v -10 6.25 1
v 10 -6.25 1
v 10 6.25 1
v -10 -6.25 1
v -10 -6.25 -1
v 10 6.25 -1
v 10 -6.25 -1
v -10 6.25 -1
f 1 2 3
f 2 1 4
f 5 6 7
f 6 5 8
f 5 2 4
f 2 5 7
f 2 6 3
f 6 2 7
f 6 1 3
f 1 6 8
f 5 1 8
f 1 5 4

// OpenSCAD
// Generated by SolidPython 1.1.3 on 2022-12-12 15:48:57


cube(center = true, size = [20, 12.5000000000, 2]);
/***********************************************
*********      SolidPython code:      **********
************************************************
 
import solid
import pudb
from solid.utils import *
import viewscad
import subprocess
import os
import os.path as osp
import math

chamfer_extrude=solid.import_scad("./chamfer_extrude.scad")
chamfer_extrude=chamfer_extrude.chamfer_extrude
r = viewscad.Renderer(width=800, height=800)

def debug(model,f_name,path="/home/ts/code/projects/mfd/designs/debug"):
    solid.scad_render_to_file(model,osp.join(path,f_name)+".scad")
#generate position list of wells using offset from center
wells_pos_from_center_4 = lambda offset: [[-offset,offset],
                                        [offset, offset],
                                        [-offset, -offset],
                                        [offset, -offset]]
#wells_pos_from_center_2 = lambda offset: [[0,offset],
#                                        [0, -offset]]
wells_pos_from_center_2 = lambda offset: [[offset,0],
                                        [-offset,0]]

def wells_top_bottom(radius,height=None, positions = None, dxf = False):
    if positions is None:
        offset = radius+radius/2.0
        positions = wells_pos_from_center_2(offset)
    if dxf or (height is None):
        height = 0
    wells = []
    for position in positions:
        #make circle if making dxf
        if dxf:
            well_shape = solid.circle(r=radius, segments=64)
            well_shape = solid.translate([position[0],position[1]])(well_shape)
        #if stl make cylinder
        else:
            well_shape = solid.cylinder(r=radius, h=height, segments=64, center = True)
            well_shape = solid.translate([position[0],position[1],height/2.0])(well_shape)
        wells.append(well_shape)
    return  union()(*wells)

#place wells in four corners 
def four_corner(radius,height=None, positions = None, dxf = False):
    #if well pos not specified set
    #to equally spaced by half radius
    if positions is None:
        offset = radius+radius/2.0
        positions = wells_pos_from_center_4(offset)
    if dxf or (height is None):
        height = 0
    #make wells at positions with specified radius and height
    wells = []
    for position in positions:
        #make circle if making dxf
        if dxf:
            well_shape = solid.circle(r=radius, segments=64)
            well_shape = solid.translate([position[0],position[1]])(well_shape)
        #if stl make cylinder
        else:
            well_shape = solid.cylinder(r=radius, h=height, segments=64, center = True)
            well_shape = solid.translate([position[0],position[1],height/2.0])(well_shape)
        wells.append(well_shape)
    return  union()(*wells)

#generate channels 
def make_channels(length,width,height=0,num_chans=1,max_chans=None,spacing=None, dxf = False,
                  rotate_channels=False):
    if dxf or (height is None):
        height = 0
    #if channel gap not defined, is equal to
    if spacing is None: spacing = width
    #calculate number of channels if fitting max num within given width
    if not max_chans is None:
        import math
        num_chans = math.floor((max_chans-spacing)/(width+spacing))
    #get total width of channel section  
    total_width = (width*num_chans)+(spacing*(num_chans-1))

    #make template channel
    #if rotate_channels: width, length = length, width
    if dxf:
        channel_t = solid.square([length,width],center = True)
    else:
        channel_t = solid.cube([length,width,height], center = True)

    #if number channels is even, offset the first channel to center its gap
    if num_chans % 2 == 0: centering = -(width/2.0+spacing/2.0)
    else: centering = 0
    #move template channel up to align bottom at z = 0 
    #and offset center if necessary
    if dxf:
        channel_t = solid.translate([0,centering])(channel_t)
    else:
        channel_t = solid.translate([0,centering,height/2.0])(channel_t)

    #if rotate_channels: length,width = width,length
    #start making the channels
    channels = []
    for i in range(num_chans):
        #if i=0 there is no translation
        #if i=1, we make the first channel adjacent to second
        direction = i

        #if i>=1, we add channels alternating left and right
        if i >= 1:
            direction = -(i/2.0)
            if i % 2 == 1: direction = (-direction)+0.5
                
        #make channel at right position and add it to channel list
        translation_coords = [0,direction*(width+spacing)]
        #if rotate_channels: translation_coords = [direction*(width+spacing),0]
        if dxf:
            channel = solid.translate(translation_coords)(channel_t)
        else:
            channel = solid.translate([*translation_coords,0])(channel_t)
        channels.append(channel)
    
    #group all channels as one object
    channels = union()(*channels)
    #compute the x,y,z dimensions in order to pass as arguments 
    #for construction of other parts of device (such as the chambers)
    measurements = {'x':(length/2.0,-length/2.0),
                    'y':(total_width/2.0,-total_width/2.0)}
    if not dxf:
        measurements['z'] = (height,0)
    if rotate_channels:
        channels = solid.rotate(90)(channels)
        measurements['x'],measurements['y']=measurements['y'],measurements['x']
    return channels,measurements

def make_chambers(msrs,height=None,extra=0,len_until=None,width=None, dxf = False):
    #computes x,y,z length
    total = lambda x : abs(x[0]) + abs(x[1])
    
    #if specific height if specified
    #otherwise use same height as channels
    if dxf:
        pass
    elif not height is None:
        msrs['z'] = (height,0)
    else:
        msrs['z'] = (0,0)
        
    #make copy of measurements from channels to modify chamber dimensions 
    #and add length to chambers as specified
    chamber_dims = msrs.copy()
    #calculate length of chamber to reach specified offset
    if not len_until is None:
        chamber_len = len_until-(msrs['x'][0])
    #or add specified length to channel length (if not specified, adds 0)
    else:
        chamber_len = msrs['x'][0]+extra
    #set the chamber length based 
    chamber_dims['x'] = (chamber_len/2.0,-(chamber_len/2.0))
    #compute final dimensions of chamber
    if not width is None:
        chamber_dims['y'] = (width/2.0,-width/2.0)
    chamber_dims = [total(size) for size in chamber_dims.values()]
        
    #calculate chamber translation offset to place adjacent to channels
    chamber_trslt = msrs['x'][0]+(chamber_len/2.0)
    #compute chamber translation coordinates to align with channels
    #x = 1 moves chamber above channels
    #x = -1 moves chamber below channels
    if dxf:
        trslt = lambda x : [x*(chamber_trslt),0]
    else:
        trslt = lambda x : [x*(chamber_trslt),0,msrs['z'][0]/2.0]
    
    #function to make chamber at top or at bottom 
    if dxf:
        move = lambda x : solid.translate(trslt(x))(solid.square(chamber_dims, center = True) )
    else:
        move = lambda x : solid.translate(trslt(x))(solid.cube(chamber_dims,center = True))
    #make top and bottom chambers and return them as grouped
    top = move(1)
    bottom = move(-1)
    #chambers=solid.rotate(90)(solid.union()(top,bottom))
    chambers=(solid.union()(top,bottom))

    return chambers

#create alignment features 
def alignment_features(unit,dims,grid_size, mask_size = None, alignment = "hollow", units_from_center = (2.5,2.5), corner_len=None):
    width = grid_size[0]*dims[0]
    length = grid_size[1]*dims[1]
    if mask_size is None and corner_len is None:
        corner_len = (dims[0] + dims[1]) /2 / 8
    corner = lambda thickness_div : solid.union()( solid.square([corner_len,corner_len/thickness_div],center=False), solid.square([corner_len/thickness_div,corner_len],center=False) )
    
    def make_full(thickness_div):
        thickness = corner_len/thickness_div
        tr = solid.translate([0, 0, 0 ])(solid.rotate(180)(corner(thickness_div)))
        tr = solid.translate([thickness/2,thickness/2,0])(tr)
        bl = solid.translate([0, 0, 0 ])(solid.rotate(0)(corner(thickness_div)))
        bl = solid.translate([-thickness/2,-thickness/2,0])(bl)
        return solid.union()(tr,bl)
    
    def make_hollow(thickness_div):
        thickness = corner_len/(thickness_div/2)
        inner = make_full(thickness_div)
        outer = make_full(thickness_div/2)
        hollow = outer - inner 
        return hollow
    
    center = (width /2 , length/2)
    mask_pos = lambda x,y : (center[0] + x*(float(units_from_center[0])*dims[0]), center[1] + y*(float(units_from_center[1])*dims[1]))
    positions = []
    positions.append(mask_pos(1,0))
    positions.append(mask_pos(0,1))
    positions.append(mask_pos(-1,0))
    positions.append(mask_pos(0,-1))
    make_mask = lambda mtype : make_hollow(8) if mtype == "hollow" else make_full(8)
    masks = [ solid.translate([*position,0])(make_mask(alignment)) for position in positions]
    
    solid.scad_render_to_file(solid.union()(*masks),"./designs/open_chamber/masks.scad")
    #return unit - solid.union()(*masks)
    return solid.union()(*masks,unit)

def create_outline(thickness, array, dims, grid_size,):
    width = grid_size[0]*dims[0] + thickness *2
    length = grid_size[1]*dims[1] + thickness *2
    outer = solid.translate([-thickness, -thickness,0])(solid.square([width, length]))
    return outer-array

def create_wall(wall_thickness, outline_thickness, dims, grid_size, wall_height = 2000, dxf = False):
    inner_width = grid_size[0]*dims[0] + outline_thickness *2
    inner_length = grid_size[1]*dims[1] + outline_thickness *2
    outer_width = inner_width + wall_thickness * 2
    outer_length = inner_length + wall_thickness * 2
    outer_pos_x = -outline_thickness-wall_thickness
    outer_pos_y = -outline_thickness-wall_thickness
    inner_pos_x = -outline_thickness
    inner_pos_y = -outline_thickness
    if dxf:
        inner_wall = solid.translate([inner_pos_x,
                                      inner_pos_y,
                                      0])(solid.square([inner_width, inner_length]))
        outer_wall = solid.translate([outer_pos_x,
                                      outer_pos_y,
                                      0])(solid.square([outer_width, outer_length]))

        return outer_wall-inner_wall
    else:
        inner_wall = solid.translate([inner_pos_x,
                                      inner_pos_y,
                                      0])(solid.cube([inner_width, inner_length,wall_height]))
        outer_wall = solid.translate([outer_pos_x,
                                      outer_pos_y,
                                      0])(solid.cube([outer_width, outer_length,wall_height]))

        return outer_wall-inner_wall, {'wall_height': wall_height,
                                       'wall_thickness': wall_thickness,
                                       'inner_width':inner_width,
                                       'inner_length': inner_length,
                                       'outer_width': outer_width,
                                       'outer_length': outer_length,
                                       'outer_pos_x' : outer_pos_x,
                                       'outer_pos_y' : outer_pos_y,
                                       'inner_pos_x' : inner_pos_x,
                                       'inner_pos_y' : inner_pos_y}

def create_thicker_wall(wall_thickness, outer_wall_offset, wall_dims, dims, grid_size, height_start = .2, height_end=2, dxf = False):
    addon_wall,thicker_wall_dims = create_wall(wall_thickness, outer_wall_offset, dims, grid_size, wall_height=height_end-height_start, dxf = False)
    addon_wall = solid.translate([0,0,height_start])(addon_wall)

    thicker_wall_dims['wall_height'] = height_end
    thicker_wall_dims['wall_thickness'] = wall_dims['wall_thickness'] + wall_thickness
    return addon_wall, thicker_wall_dims
 
def add_lock_to_wall(wall,wall_dims,y_offset = 0,cut_ratio=0.7,L_length=3, gap_ratio=0.05, axis="x",width_ratio=1/2):
    # Makes L shape
    def make_L(max_length,length_thickness,max_width,width_thickness,height,y_offset):
        length = solid.cube([max_length,length_thickness,height])
        width = solid.cube([width_thickness,max_width,height])
        width = solid.translate([max_length-(width_thickness),0,0])(width)
        L = solid.union()(width,length)
        debug(L,"L")
        if axis == "x":
            L = solid.rotate(-90)(L)
            L = solid.translate([0,max_length,0])(L)
        else:
            L = solid.rotate(-180)(L)
            L = solid.translate([max_length,max_width,0])(L)
        return solid.translate([0,0,y_offset])(L)
    
    lock_length = L_length
    lock_width = wall_dims['wall_thickness']*width_ratio
    lock_length_thickness = lock_width/2
    lock_width_thickness = lock_width/2
    L_lock = make_L(lock_length,lock_length_thickness,lock_width,lock_width_thickness, wall_dims['wall_height']-y_offset, y_offset)
    
    margin_space = lock_length - lock_length*(1-gap_ratio)
    key_length = lock_length-margin_space
    key_length_thickness = lock_length_thickness-(margin_space*2)
    key_width = lock_width-(margin_space*2)
    key_width_thickness = lock_width_thickness-(margin_space*2)
    L_key = make_L(key_length,key_length_thickness,key_width,key_width_thickness, wall_dims['wall_height']-y_offset, y_offset)
    L_key = solid.translate([margin_space,margin_space,0])(L_key)
    L = solid.union()(L_lock,L_key)
    debug(L,"L")
    
    #Make cube to be used as negative to split frame in a half
    #Can choose if making left or right negative, specify ratio of split
    def make_negative(right,cut_ratio):
        if axis == "x":
            if right:
                length = wall_dims['outer_length']*(1-cut_ratio)
                pos_x = wall_dims['outer_pos_x']+(wall_dims['outer_length']*cut_ratio)
            else:
                length = wall_dims['outer_length']*(cut_ratio)
                pos_x = wall_dims['outer_pos_x'] 
            negative = solid.cube([wall_dims['outer_width'],length, wall_dims['wall_height']])
            negative = solid.translate([wall_dims['outer_pos_y'],pos_x,0])(negative)
        else:
            if right:
                length = wall_dims['outer_width']*(1-cut_ratio)
                pos_x = wall_dims['outer_pos_y']+(wall_dims['outer_width']*cut_ratio)
            else:
                length = wall_dims['outer_width']*(cut_ratio)
                pos_x = wall_dims['outer_pos_y'] 
            negative = solid.cube([length,wall_dims['outer_length'], wall_dims['wall_height']])
            negative = solid.translate([pos_x,wall_dims['outer_pos_x'],0])(negative)
        return negative, pos_x, length 
                      
    #Make negatives
    negative_right, right_half_pos_x, right_half_length = make_negative(True,cut_ratio)
    negative_left, left_half_pos_x, right_half_length = make_negative(False,cut_ratio)
    #Make halves
    left_half = solid.difference()(wall,negative_right)
    right_half = solid.difference()(wall,negative_left)
    def place_L(L, L_length,L_width):
        #Place L on top wall       
        offset_to_center = (wall_dims['wall_thickness']-L_width)/2
        if axis == "x":
            y_pos_top = (wall_dims['outer_pos_y'] +
                    wall_dims['outer_width'] - 
                    L_width - offset_to_center)
            top_L = solid.translate([y_pos_top,
                                     right_half_pos_x-(L_length),
                                     0])(L)
            #Place L on bottom wall       
            y_pos_bottom = wall_dims['outer_pos_y']+offset_to_center
            bottom_L = solid.translate([y_pos_bottom,
                                        right_half_pos_x-L_length,
                                        0])(L)
        else:
            y_pos_top = (wall_dims['outer_pos_x'] +
                    wall_dims['outer_length'] -
                    (L_width+offset_to_center))
            top_L = solid.translate([right_half_pos_x-L_length,
                                     y_pos_top,
                                     0])(L)
            #Place L on bottom wall       
            y_pos_bottom = wall_dims['outer_pos_y']+offset_to_center
            bottom_L = solid.translate([right_half_pos_x-L_length,
                                        y_pos_bottom,
                                        0])(L)
        return bottom_L, top_L
    #Make complimentary L pieces through union and differences
    #Make Lock
    bottom_L_lock, top_L_lock = place_L(L_lock,L_length,lock_width)
    left_half = solid.difference()(left_half,bottom_L_lock)
    left_half = solid.difference()(left_half,top_L_lock)
    #Make Key
    bottom_L_key, top_L_key = place_L(L_key,L_length,lock_width)
    right_half = solid.union()(right_half,bottom_L_key)
    right_half = solid.union()(right_half,top_L_key)
    return left_half, right_half


#build a row x col grid of containment units
def make_unit_array(unit,dims,grid_size, dxf = False, alignment = None, mask_size = None,
                    units_from_center = None,alignment_offset=None, alignment_mark_size=1):
    units = []
    for col in range(grid_size[1]):
        for row in range(grid_size[0]):
            if dxf:
                units.append(solid.translate([row*dims[0],col*dims[1]])(unit))
            else:
                units.append(solid.translate([row*dims[0],col*dims[1],dims[2]/2.0])(unit))
    array = solid.union()(*units)
    if (not alignment is None) and dxf:
        if not alignment_offset is None:
            array = solid.translate([alignment_offset[0],alignment_offset[1]])(array)
        array = alignment_features(array,dims, grid_size, alignment = alignment, mask_size = None, units_from_center = units_from_center,corner_len=alignment_mark_size)
        if not alignment_offset is None:
            array = solid.translate([-alignment_offset[0],-alignment_offset[1]])(array)
    return array


def make_taylor(wells_pos = wells_pos_from_center_4(2.25), well_rad = 1.5 ,
                well_height = 2, chan_w = 0.01, chan_l = 1, chan_h = 0.010 ,
                chan_gap = 0.040, max_chans = None,num_chans=100, chamber_height  = 0.100,
                columns = 1, rows = 1, chamber_len_until=2.25, add_channels = True, add_wells = True, 
                add_chambers = True, save_path = "./", alignment = None, units_from_center = 2,
                mask_size = None, render_stl = False, outline_thickness = 0.050, dxf = True,
                wall_height = 15, wall_thickness = 0.95, casing_x=9, casing_y=9, casing_z=0,rotate_units=0):

    dims = [casing_x, casing_y, casing_z]
    wells = four_corner(well_rad,well_height, dxf = dxf, positions = wells_pos)
    debug(wells,"wells")
    channels, msrs = make_channels(chan_l,chan_w,chan_h,dxf=dxf, spacing = chan_gap, max_chans=max_chans,num_chans=num_chans)
    debug(channels,"channels")
    chambers = make_chambers(msrs,dxf = dxf, height=chamber_height,len_until=chamber_len_until)
    debug(chambers,"chambers")

    #add together and render
    device_parts = []
    if add_channels:
        device_parts.append(channels)
    if add_wells:
        device_parts.append(wells)
    if add_chambers:
        device_parts.append(chambers)
    device=union()(*device_parts)
    device = rotate(rotate_units)(device)

    device=solid.translate([dims[0]/2.0,dims[1]/2.0,0])(device)
    channels = rotate(rotate_units)(channels)
    channels=solid.translate([dims[0]/2,dims[1]/2,0])(channels)
    chambers_wells = union()(wells,chambers)
    chambers_wells = rotate(rotate_units)(chambers_wells)
    chambers_wells=solid.translate([dims[0]/2,dims[1]/2,0])(chambers_wells)

    file_name = str(rows)+'x'+str(columns)+'_units_'
    grid_size = [rows,columns]

    if alignment:
        alignment="full"
    device = make_unit_array(device,dims,grid_size, dxf=dxf, alignment = alignment,
                                 units_from_center = units_from_center)
    channels = make_unit_array(channels,dims,grid_size, dxf=dxf, alignment = alignment,
                                 units_from_center = units_from_center)
    if alignment=="full":
        alignment="hollow"

    chambers_wells = make_unit_array(chambers_wells,dims,grid_size, dxf=dxf, alignment = alignment,
                                 units_from_center =units_from_center)

    def save_model(model,prefix):
        model_fname = os.path.abspath(save_path+prefix+"_"+file_name+".scad")
        solid.scad_render_to_file(model,model_fname)
        return model_fname

    wells_fname = save_model(wells,"wells")
    channels_fname = save_model(channels,"channels")
    device_fname = save_model(device,"device")
    chambers_wells_fname = save_model(chambers_wells,"chambers_wells")
    return (chambers_wells,chambers_wells_fname), (channels,channels_fname), (device,device_fname)

def make_device(design='open',rows=8,columns=6,wells_pos = 4.5, well_rad=3.2,well_height=0.1,
                chan_l=1,chan_w=0.01,chan_h=0.01,chan_gap=0.015,num_chans=101,dxf=True,save_path="./designs/open_chamber/",
                casing_x=9.0,casing_y=18.0,casing_z=0,rotate_units=90,units_from_center=(3,1),chamber_len_until=4.5,
                chamber_width=None,alignment=True, add_wells=True, add_channels=True,add_chambers=True):

    dims = [casing_x, casing_y, casing_z]
    if design == "open":
        wells_pos=wells_pos_from_center_2(wells_pos)
        wells = wells_top_bottom(well_rad,height=well_height, dxf = dxf, positions = wells_pos)
    elif design == "closed":
        wells_pos=wells_pos_from_center_4(wells_pos)
        wells = four_corner(well_rad,well_height, dxf = dxf, positions = wells_pos)
    else:
        print(design+" is not a valid design.\n Choose valid design: 'open' or 'closed'")
        exit()
    wells = rotate(rotate_units)(wells)
    wells=solid.translate([dims[0]/2,dims[1]/2,0])(wells)



    channels, msrs = make_channels(chan_l,chan_w,chan_h,dxf=dxf, spacing = chan_gap, num_chans=num_chans,rotate_channels=False)
    channels = rotate(rotate_units)(channels)
    channels=solid.translate([dims[0]/2,dims[1]/2,0])(channels)

    chambers=make_chambers(msrs,height=None,extra=0,len_until=chamber_len_until, width=chamber_width,dxf = dxf)
    chambers = rotate(rotate_units)(chambers)
    chambers=solid.translate([dims[0]/2,dims[1]/2,0])(chambers)

    device_parts = []
    if add_channels:
        device_parts.append(channels)
    if add_wells:
        device_parts.append(wells)
    if add_chambers:
        device_parts.append(chambers)
    device = union()(*device_parts)
    #device = rotate(rotate_units)(device)
    #device=solid.translate([dims[0]/2.0,dims[1]/2.0,0])(device)

    chambers_wells = []
    if add_chambers:
        chambers_wells.append(chambers)
    if add_wells:
        chambers_wells.append(wells)
    chambers_wells = union()(*chambers_wells)
    #chambers_wells = union()(wells,chambers)
    #chambers_wells = rotate(rotate_units)(chambers_wells)
    #chambers_wells=solid.translate([dims[0]/2,dims[1]/2,0])(chambers_wells)

    file_name = str(rows)+'x'+str(columns)+'_units_'

    grid_size = [rows,columns]
    if alignment:
        alignment="full"
    device = make_unit_array(device,dims,grid_size, dxf=dxf, alignment = alignment,
                                 units_from_center = units_from_center)
    channels = make_unit_array(channels,dims,grid_size, dxf=dxf, alignment = alignment,
                                 units_from_center = units_from_center)
    if alignment=="full":
        alignment="hollow"

    chambers_wells = make_unit_array(chambers_wells,dims,grid_size, dxf=dxf, alignment = alignment,
                                 units_from_center =units_from_center)

    def save_model(model,prefix):
        model_fname = os.path.abspath(save_path+prefix+"_"+file_name+".scad")
        solid.scad_render_to_file(model,model_fname)
        return model_fname

    wells_fname = save_model(wells,"wells")
    channels_fname = save_model(channels,"channels")
    device_fname = save_model(device,"device")
    chambers_wells_fname = save_model(chambers_wells,"chambers_wells")
    return (chambers_wells,chambers_wells_fname), (channels,channels_fname), (device,device_fname)


def make_open_chamber(rows=8,columns=6,wells_pos = wells_pos_from_center_2(4.5), well_rad=3.2,well_height=0.1,
                      chan_l=1,chan_w=0.01,chan_h=0.01,chan_gap=0.015,num_chans=101,dxf=True,save_path="./designs/open_chamber/",
                      casing_x=9.0,casing_y=18.0,casing_z=0,rotate_units=90,units_from_center=(3,1),chamber_len_until=4.5,
                      chamber_width=None,alignment=True, add_wells=True, add_channels=True,add_chambers=True):

    dims = [casing_x, casing_y, casing_z]
    wells = wells_top_bottom(well_rad,height=well_height, dxf = dxf, positions = wells_pos)
    channels, msrs = make_channels(chan_l,chan_w,chan_h,dxf=dxf, spacing = chan_gap, num_chans=num_chans,rotate_channels=False)
    chambers=make_chambers(msrs,height=None,extra=0,len_until=chamber_len_until, width=chamber_width,dxf = dxf)
    debug(chambers,"chambers")
    device_parts = []
    if add_channels:
        device_parts.append(channels)
    if add_wells:
        device_parts.append(wells)
    if add_chambers:
        device_parts.append(chambers)
    device = union()(*device_parts)
    device = rotate(rotate_units)(device)
    device=solid.translate([dims[0]/2.0,dims[1]/2.0,0])(device)
    channels = rotate(rotate_units)(channels)
    channels=solid.translate([dims[0]/2,dims[1]/2,0])(channels)
    chambers_wells = union()(wells,chambers)
    chambers_wells = rotate(rotate_units)(chambers_wells)
    chambers_wells=solid.translate([dims[0]/2,dims[1]/2,0])(chambers_wells)

    file_name = str(rows)+'x'+str(columns)+'_units_'

    grid_size = [rows,columns]
    if alignment:
        alignment="full"
    device = make_unit_array(device,dims,grid_size, dxf=dxf, alignment = alignment,
                                 units_from_center = units_from_center)
    channels = make_unit_array(channels,dims,grid_size, dxf=dxf, alignment = alignment,
                                 units_from_center = units_from_center)
    if alignment=="full":
        alignment="hollow"

    chambers_wells = make_unit_array(chambers_wells,dims,grid_size, dxf=dxf, alignment = alignment,
                                 units_from_center =units_from_center)

    def save_model(model,prefix):
        model_fname = os.path.abspath(save_path+prefix+"_"+file_name+".scad")
        solid.scad_render_to_file(model,model_fname)
        return model_fname

    wells_fname = save_model(wells,"wells")
    channels_fname = save_model(channels,"channels")
    device_fname = save_model(device,"device")
    chambers_wells_fname = save_model(chambers_wells,"chambers_wells")
    return (chambers_wells,chambers_wells_fname), (channels,channels_fname), (device,device_fname)

def to_dxf(scad_path):
    dxf_path = scad_path.replace(".scad",".dxf")
    subprocess.call(["openscad", "-o", dxf_path, scad_path])
    import ezdxf
    temp_dxf = ezdxf.readfile(dxf_path)
    temp_dxf.saveas(dxf_path)

#def make_walls(diameter,thickness,grid_size,dims,height=20,segments=256,make_inner=True):
#    wafer_wall_out = solid.cylinder(r=diameter/2,h=height, segments=segments)
#    wafer_wall_in = solid.cylinder(r=(diameter/2-thickness),h=height, segments=segments)
#    wafer_wall = solid.difference()(wafer_wall_out,wafer_wall_in)
#    wafer_wall = solid.translate([grid_size[1]*dims[1]/2.0,grid_size[0]*dims[0]/2.0])(wafer_wall)
#
#    vertical_wall_length = grid_size[1]*dims[1]
#    horizontal_wall_length = grid_size[0]*dims[0]
#    vertical_wall = solid.cube([vertical_wall_length,thickness,height],center = True)
#    vertical_wall = solid.translate([vertical_wall_length/2,0,height/2])(vertical_wall)
#    horizontal_wall = solid.cube([thickness,horizontal_wall_length,height],center = True)
#    horizontal_wall = solid.translate([0,vertical_wall_length/2,height/2])(horizontal_wall)
#    walls = []
#    walls.append(horizontal_wall)
#    walls.append(vertical_wall)
#    for col in range(grid_size[1]):
#        if col == grid_size[1]-1: 
#            walls.append(solid.translate([0,(col+1)*dims[1]])(vertical_wall))
#        elif col > 0 and col < grid_size[1]-1 and make_inner==True:
#            walls.append(solid.translate([0,(col+1)*dims[1]])(vertical_wall))
#    for row in range(grid_size[0]):
#        if row == grid_size[0]-1: 
#            walls.append(solid.translate([(row+1)*dims[0],0])(horizontal_wall))
#        elif row > 0 and row < grid_size[0]-1 and make_inner==True:
#            walls.append(solid.translate([(row+1)*dims[0],0])(horizontal_wall))
#    walls = union()(*walls)
#    wafer_walls = union()(walls,wafer_wall)
#    return walls,wafer_wall,wafer_walls

def make_walls(diameter,thickness,grid_size,dims,height=20,segments=256,make_inner=True,padx=0,pady=0):
    wafer_wall_out = solid.cylinder(r=diameter/2,h=height, segments=segments)
    wafer_wall_in = solid.cylinder(r=(diameter/2-thickness),h=height, segments=segments)
    wafer_wall = solid.difference()(wafer_wall_out,wafer_wall_in)
    wafer_wall = solid.translate([grid_size[1]*dims[1]/2.0,grid_size[0]*dims[0]/2.0])(wafer_wall)

    vertical_wall_length = grid_size[0]*dims[0]+padx
    horizontal_wall_length = grid_size[1]*dims[1]+pady
    vertical_wall = solid.cube([vertical_wall_length,thickness,height],center = True)
    vertical_wall = solid.translate([vertical_wall_length/2-pady/2,-padx/2,height/2])(vertical_wall)
    horizontal_wall = solid.cube([thickness,horizontal_wall_length,height],center = True)
    horizontal_wall = solid.translate([-pady/2,horizontal_wall_length/2-padx/2,height/2])(horizontal_wall)
    walls = []
    walls.append(horizontal_wall)
    walls.append(vertical_wall)
    for col in range(grid_size[1]):
        if col == grid_size[1]-1: 
            walls.append(solid.translate([0,(col+1)*dims[1]+pady])(vertical_wall))
        elif col > 0 and col < grid_size[1]-1 and make_inner==True:
            walls.append(solid.translate([0,(col+1)*dims[1]])(vertical_wall))
    for row in range(grid_size[0]):
        if row == grid_size[0]-1: 
            walls.append(solid.translate([(row+1)*dims[0]+padx,0])(horizontal_wall))
        elif row > 0 and row < grid_size[0]-1 and make_inner==True:
            walls.append(solid.translate([(row+1)*dims[0],0])(horizontal_wall))
    walls = union()(*walls)
    wafer_walls = union()(walls,wafer_wall)
    return walls,wafer_wall,wafer_walls

def save_model(model,base_path,base_name,dxf=True):
    if not os.path.exists(base_path):
        os.makedirs(base_path)
    dxf_path=osp.join(base_path,base_name+".scad")
    solid.scad_render_to_file(model,osp.join(dxf_path))
    if dxf:
        to_dxf(dxf_path)

def make_wafer(diameter,flat_len,thickness):
    wafer = solid.cylinder(r1=diameter/2,r2=diameter/2,h=thickness,segments=512,)()
    x_start_flat=(flat_len/2)
    y_start_flat = math.sqrt(((diameter/2)**2) - (x_start_flat**2) )
    height_delete_flat=diameter/2-y_start_flat
    flat_delete = solid.cube([flat_len,height_delete_flat,thickness],center=False)()
    flat_delete = solid.translate([-flat_len/2,y_start_flat,0])(flat_delete)
    wafer = solid.difference()(wafer,flat_delete)
    wafer = solid.rotate(90)(wafer)
    return wafer

def add_wafer_to_mask(wafer_size,flat_len,mask,grid_size,dims,wafer_line_thickness=0.1,outer_mask_thickness=5,alignment_offset=None):
    def make_wafer_mask(wafer_size,flat_len):
        wafer_mask = make_wafer(wafer_size,flat_len,1)
        wafer_mask = solid.projection()(wafer_mask)
        wafer_mask = solid.translate([grid_size[0]*dims[0]/2.0,grid_size[1]*dims[1]/2.0])(wafer_mask)
        if not alignment_offset is None:
            wafer_mask = solid.translate([-alignment_offset[0],-alignment_offset[1]])(wafer_mask)
        return wafer_mask

    inner_wafer_line_mask = make_wafer_mask(wafer_size-wafer_line_thickness/2,flat_len)
    outer_wafer_line_mask = make_wafer_mask(wafer_size+wafer_line_thickness/2,flat_len)
    outer_wafer_mask = make_wafer_mask(wafer_size+outer_mask_thickness,flat_len)
    outer_wafer_mask = solid.difference()(outer_wafer_mask,outer_wafer_line_mask)
    wafer_mask = solid.union()(outer_wafer_mask,inner_wafer_line_mask)

    return solid.difference()(wafer_mask,mask)

def make_posts(post_shape,post_height):
    posts = solid.linear_extrude(height=post_height)(post_shape)
    return posts

def make_wafer_empty(diameter,flat_len,thickness,margin,notch_len=20,notch_height=5,oversize=1.01):
    diameter*=oversize
    flat_len*=oversize
    wafer = make_wafer(diameter,flat_len,thickness)
    holder = solid.cylinder(r1=diameter/2+margin,r2=diameter/2+margin,h=thickness,segments=512)()
    holder = solid.difference()(holder,wafer)

    x_start_flat=(flat_len/2)
    y_start_flat = math.sqrt(((diameter/2)**2) - (x_start_flat**2) )
    height_delete_flat=diameter/2-y_start_flat
    notch = solid.cube([notch_len,notch_height,thickness],center=False)()
    notch = solid.translate([-notch_len/2,y_start_flat,0])(notch)
    notch = solid.rotate(90)(notch)
    return solid.difference()(holder,notch)

def wafer_print_calibration(diameter,thickness,height,z_offset):
    circles = []
    radii = []
    radii.append(diameter/2.0*0.8)
    radii.append(diameter/2.0*0.6)
    radii.append(diameter/2.0*0.4)
    radii.append(diameter/2.0*0.2)
    for radius in radii:
        inner = solid.cylinder(r1=radius-(thickness/2.0),r2=radius-(thickness/2.0),h=thickness,segments=512,)()
        outer = solid.cylinder(r1=radius+(thickness/2.0),r2=radius+(thickness/2.0),h=thickness,segments=512,)()
        diff = solid.difference()(outer,inner)
        circles.append(diff)
    circles = solid.union()(*circles)
    circles = solid.translate([0,0,z_offset])(circles)
    return circles

def make_rack(wells,dims,grid_size,alignment_offset,rack_x,rack_y,rack_thickness,bolt_width,add_bolts=True):

    #get X and Y dimensions of gride of pipette tips
    X_len = dims[0]*grid_size[0]
    Y_len = dims[1]*grid_size[1]
    #make rack
    rack = solid.cube([rack_x,rack_y,rack_thickness],center=True)

    if add_bolts:
    #add bolt holes
        bolt_hole=solid.cylinder(r=bolt_width/2,h=rack_thickness,center=True)()
        bolt_holes = []
        bolt_holes.append(solid.translate([rack_x/2-1.5*bolt_width,rack_y/2-1.5*bolt_width])(bolt_hole))
        bolt_holes.append(solid.translate([-rack_x/2+1.5*bolt_width,rack_y/2-1.5*bolt_width])(bolt_hole))
        bolt_holes.append(solid.translate([-rack_x/2+1.5*bolt_width,-rack_y/2+1.5*bolt_width])(bolt_hole))
        bolt_holes.append(solid.translate([rack_x/2-1.5*bolt_width,-rack_y/2+1.5*bolt_width])(bolt_hole))
        bolt_holes = solid.union()(*bolt_holes)
        rack=solid.difference()(rack,bolt_holes)
    rack_support = rack

    #center rack with pipette holes
    rack = solid.translate([0,0,rack_thickness/2])(rack)
    rack = solid.translate([X_len/2,Y_len/2])(rack)
    rack = solid.translate([-alignment_offset[0],-alignment_offset[1]])(rack)
    wells = solid.linear_extrude(height=rack_thickness)(wells)
    rack = solid.difference()(rack,wells)
    return rack, rack_support





 
 
************************************************/
